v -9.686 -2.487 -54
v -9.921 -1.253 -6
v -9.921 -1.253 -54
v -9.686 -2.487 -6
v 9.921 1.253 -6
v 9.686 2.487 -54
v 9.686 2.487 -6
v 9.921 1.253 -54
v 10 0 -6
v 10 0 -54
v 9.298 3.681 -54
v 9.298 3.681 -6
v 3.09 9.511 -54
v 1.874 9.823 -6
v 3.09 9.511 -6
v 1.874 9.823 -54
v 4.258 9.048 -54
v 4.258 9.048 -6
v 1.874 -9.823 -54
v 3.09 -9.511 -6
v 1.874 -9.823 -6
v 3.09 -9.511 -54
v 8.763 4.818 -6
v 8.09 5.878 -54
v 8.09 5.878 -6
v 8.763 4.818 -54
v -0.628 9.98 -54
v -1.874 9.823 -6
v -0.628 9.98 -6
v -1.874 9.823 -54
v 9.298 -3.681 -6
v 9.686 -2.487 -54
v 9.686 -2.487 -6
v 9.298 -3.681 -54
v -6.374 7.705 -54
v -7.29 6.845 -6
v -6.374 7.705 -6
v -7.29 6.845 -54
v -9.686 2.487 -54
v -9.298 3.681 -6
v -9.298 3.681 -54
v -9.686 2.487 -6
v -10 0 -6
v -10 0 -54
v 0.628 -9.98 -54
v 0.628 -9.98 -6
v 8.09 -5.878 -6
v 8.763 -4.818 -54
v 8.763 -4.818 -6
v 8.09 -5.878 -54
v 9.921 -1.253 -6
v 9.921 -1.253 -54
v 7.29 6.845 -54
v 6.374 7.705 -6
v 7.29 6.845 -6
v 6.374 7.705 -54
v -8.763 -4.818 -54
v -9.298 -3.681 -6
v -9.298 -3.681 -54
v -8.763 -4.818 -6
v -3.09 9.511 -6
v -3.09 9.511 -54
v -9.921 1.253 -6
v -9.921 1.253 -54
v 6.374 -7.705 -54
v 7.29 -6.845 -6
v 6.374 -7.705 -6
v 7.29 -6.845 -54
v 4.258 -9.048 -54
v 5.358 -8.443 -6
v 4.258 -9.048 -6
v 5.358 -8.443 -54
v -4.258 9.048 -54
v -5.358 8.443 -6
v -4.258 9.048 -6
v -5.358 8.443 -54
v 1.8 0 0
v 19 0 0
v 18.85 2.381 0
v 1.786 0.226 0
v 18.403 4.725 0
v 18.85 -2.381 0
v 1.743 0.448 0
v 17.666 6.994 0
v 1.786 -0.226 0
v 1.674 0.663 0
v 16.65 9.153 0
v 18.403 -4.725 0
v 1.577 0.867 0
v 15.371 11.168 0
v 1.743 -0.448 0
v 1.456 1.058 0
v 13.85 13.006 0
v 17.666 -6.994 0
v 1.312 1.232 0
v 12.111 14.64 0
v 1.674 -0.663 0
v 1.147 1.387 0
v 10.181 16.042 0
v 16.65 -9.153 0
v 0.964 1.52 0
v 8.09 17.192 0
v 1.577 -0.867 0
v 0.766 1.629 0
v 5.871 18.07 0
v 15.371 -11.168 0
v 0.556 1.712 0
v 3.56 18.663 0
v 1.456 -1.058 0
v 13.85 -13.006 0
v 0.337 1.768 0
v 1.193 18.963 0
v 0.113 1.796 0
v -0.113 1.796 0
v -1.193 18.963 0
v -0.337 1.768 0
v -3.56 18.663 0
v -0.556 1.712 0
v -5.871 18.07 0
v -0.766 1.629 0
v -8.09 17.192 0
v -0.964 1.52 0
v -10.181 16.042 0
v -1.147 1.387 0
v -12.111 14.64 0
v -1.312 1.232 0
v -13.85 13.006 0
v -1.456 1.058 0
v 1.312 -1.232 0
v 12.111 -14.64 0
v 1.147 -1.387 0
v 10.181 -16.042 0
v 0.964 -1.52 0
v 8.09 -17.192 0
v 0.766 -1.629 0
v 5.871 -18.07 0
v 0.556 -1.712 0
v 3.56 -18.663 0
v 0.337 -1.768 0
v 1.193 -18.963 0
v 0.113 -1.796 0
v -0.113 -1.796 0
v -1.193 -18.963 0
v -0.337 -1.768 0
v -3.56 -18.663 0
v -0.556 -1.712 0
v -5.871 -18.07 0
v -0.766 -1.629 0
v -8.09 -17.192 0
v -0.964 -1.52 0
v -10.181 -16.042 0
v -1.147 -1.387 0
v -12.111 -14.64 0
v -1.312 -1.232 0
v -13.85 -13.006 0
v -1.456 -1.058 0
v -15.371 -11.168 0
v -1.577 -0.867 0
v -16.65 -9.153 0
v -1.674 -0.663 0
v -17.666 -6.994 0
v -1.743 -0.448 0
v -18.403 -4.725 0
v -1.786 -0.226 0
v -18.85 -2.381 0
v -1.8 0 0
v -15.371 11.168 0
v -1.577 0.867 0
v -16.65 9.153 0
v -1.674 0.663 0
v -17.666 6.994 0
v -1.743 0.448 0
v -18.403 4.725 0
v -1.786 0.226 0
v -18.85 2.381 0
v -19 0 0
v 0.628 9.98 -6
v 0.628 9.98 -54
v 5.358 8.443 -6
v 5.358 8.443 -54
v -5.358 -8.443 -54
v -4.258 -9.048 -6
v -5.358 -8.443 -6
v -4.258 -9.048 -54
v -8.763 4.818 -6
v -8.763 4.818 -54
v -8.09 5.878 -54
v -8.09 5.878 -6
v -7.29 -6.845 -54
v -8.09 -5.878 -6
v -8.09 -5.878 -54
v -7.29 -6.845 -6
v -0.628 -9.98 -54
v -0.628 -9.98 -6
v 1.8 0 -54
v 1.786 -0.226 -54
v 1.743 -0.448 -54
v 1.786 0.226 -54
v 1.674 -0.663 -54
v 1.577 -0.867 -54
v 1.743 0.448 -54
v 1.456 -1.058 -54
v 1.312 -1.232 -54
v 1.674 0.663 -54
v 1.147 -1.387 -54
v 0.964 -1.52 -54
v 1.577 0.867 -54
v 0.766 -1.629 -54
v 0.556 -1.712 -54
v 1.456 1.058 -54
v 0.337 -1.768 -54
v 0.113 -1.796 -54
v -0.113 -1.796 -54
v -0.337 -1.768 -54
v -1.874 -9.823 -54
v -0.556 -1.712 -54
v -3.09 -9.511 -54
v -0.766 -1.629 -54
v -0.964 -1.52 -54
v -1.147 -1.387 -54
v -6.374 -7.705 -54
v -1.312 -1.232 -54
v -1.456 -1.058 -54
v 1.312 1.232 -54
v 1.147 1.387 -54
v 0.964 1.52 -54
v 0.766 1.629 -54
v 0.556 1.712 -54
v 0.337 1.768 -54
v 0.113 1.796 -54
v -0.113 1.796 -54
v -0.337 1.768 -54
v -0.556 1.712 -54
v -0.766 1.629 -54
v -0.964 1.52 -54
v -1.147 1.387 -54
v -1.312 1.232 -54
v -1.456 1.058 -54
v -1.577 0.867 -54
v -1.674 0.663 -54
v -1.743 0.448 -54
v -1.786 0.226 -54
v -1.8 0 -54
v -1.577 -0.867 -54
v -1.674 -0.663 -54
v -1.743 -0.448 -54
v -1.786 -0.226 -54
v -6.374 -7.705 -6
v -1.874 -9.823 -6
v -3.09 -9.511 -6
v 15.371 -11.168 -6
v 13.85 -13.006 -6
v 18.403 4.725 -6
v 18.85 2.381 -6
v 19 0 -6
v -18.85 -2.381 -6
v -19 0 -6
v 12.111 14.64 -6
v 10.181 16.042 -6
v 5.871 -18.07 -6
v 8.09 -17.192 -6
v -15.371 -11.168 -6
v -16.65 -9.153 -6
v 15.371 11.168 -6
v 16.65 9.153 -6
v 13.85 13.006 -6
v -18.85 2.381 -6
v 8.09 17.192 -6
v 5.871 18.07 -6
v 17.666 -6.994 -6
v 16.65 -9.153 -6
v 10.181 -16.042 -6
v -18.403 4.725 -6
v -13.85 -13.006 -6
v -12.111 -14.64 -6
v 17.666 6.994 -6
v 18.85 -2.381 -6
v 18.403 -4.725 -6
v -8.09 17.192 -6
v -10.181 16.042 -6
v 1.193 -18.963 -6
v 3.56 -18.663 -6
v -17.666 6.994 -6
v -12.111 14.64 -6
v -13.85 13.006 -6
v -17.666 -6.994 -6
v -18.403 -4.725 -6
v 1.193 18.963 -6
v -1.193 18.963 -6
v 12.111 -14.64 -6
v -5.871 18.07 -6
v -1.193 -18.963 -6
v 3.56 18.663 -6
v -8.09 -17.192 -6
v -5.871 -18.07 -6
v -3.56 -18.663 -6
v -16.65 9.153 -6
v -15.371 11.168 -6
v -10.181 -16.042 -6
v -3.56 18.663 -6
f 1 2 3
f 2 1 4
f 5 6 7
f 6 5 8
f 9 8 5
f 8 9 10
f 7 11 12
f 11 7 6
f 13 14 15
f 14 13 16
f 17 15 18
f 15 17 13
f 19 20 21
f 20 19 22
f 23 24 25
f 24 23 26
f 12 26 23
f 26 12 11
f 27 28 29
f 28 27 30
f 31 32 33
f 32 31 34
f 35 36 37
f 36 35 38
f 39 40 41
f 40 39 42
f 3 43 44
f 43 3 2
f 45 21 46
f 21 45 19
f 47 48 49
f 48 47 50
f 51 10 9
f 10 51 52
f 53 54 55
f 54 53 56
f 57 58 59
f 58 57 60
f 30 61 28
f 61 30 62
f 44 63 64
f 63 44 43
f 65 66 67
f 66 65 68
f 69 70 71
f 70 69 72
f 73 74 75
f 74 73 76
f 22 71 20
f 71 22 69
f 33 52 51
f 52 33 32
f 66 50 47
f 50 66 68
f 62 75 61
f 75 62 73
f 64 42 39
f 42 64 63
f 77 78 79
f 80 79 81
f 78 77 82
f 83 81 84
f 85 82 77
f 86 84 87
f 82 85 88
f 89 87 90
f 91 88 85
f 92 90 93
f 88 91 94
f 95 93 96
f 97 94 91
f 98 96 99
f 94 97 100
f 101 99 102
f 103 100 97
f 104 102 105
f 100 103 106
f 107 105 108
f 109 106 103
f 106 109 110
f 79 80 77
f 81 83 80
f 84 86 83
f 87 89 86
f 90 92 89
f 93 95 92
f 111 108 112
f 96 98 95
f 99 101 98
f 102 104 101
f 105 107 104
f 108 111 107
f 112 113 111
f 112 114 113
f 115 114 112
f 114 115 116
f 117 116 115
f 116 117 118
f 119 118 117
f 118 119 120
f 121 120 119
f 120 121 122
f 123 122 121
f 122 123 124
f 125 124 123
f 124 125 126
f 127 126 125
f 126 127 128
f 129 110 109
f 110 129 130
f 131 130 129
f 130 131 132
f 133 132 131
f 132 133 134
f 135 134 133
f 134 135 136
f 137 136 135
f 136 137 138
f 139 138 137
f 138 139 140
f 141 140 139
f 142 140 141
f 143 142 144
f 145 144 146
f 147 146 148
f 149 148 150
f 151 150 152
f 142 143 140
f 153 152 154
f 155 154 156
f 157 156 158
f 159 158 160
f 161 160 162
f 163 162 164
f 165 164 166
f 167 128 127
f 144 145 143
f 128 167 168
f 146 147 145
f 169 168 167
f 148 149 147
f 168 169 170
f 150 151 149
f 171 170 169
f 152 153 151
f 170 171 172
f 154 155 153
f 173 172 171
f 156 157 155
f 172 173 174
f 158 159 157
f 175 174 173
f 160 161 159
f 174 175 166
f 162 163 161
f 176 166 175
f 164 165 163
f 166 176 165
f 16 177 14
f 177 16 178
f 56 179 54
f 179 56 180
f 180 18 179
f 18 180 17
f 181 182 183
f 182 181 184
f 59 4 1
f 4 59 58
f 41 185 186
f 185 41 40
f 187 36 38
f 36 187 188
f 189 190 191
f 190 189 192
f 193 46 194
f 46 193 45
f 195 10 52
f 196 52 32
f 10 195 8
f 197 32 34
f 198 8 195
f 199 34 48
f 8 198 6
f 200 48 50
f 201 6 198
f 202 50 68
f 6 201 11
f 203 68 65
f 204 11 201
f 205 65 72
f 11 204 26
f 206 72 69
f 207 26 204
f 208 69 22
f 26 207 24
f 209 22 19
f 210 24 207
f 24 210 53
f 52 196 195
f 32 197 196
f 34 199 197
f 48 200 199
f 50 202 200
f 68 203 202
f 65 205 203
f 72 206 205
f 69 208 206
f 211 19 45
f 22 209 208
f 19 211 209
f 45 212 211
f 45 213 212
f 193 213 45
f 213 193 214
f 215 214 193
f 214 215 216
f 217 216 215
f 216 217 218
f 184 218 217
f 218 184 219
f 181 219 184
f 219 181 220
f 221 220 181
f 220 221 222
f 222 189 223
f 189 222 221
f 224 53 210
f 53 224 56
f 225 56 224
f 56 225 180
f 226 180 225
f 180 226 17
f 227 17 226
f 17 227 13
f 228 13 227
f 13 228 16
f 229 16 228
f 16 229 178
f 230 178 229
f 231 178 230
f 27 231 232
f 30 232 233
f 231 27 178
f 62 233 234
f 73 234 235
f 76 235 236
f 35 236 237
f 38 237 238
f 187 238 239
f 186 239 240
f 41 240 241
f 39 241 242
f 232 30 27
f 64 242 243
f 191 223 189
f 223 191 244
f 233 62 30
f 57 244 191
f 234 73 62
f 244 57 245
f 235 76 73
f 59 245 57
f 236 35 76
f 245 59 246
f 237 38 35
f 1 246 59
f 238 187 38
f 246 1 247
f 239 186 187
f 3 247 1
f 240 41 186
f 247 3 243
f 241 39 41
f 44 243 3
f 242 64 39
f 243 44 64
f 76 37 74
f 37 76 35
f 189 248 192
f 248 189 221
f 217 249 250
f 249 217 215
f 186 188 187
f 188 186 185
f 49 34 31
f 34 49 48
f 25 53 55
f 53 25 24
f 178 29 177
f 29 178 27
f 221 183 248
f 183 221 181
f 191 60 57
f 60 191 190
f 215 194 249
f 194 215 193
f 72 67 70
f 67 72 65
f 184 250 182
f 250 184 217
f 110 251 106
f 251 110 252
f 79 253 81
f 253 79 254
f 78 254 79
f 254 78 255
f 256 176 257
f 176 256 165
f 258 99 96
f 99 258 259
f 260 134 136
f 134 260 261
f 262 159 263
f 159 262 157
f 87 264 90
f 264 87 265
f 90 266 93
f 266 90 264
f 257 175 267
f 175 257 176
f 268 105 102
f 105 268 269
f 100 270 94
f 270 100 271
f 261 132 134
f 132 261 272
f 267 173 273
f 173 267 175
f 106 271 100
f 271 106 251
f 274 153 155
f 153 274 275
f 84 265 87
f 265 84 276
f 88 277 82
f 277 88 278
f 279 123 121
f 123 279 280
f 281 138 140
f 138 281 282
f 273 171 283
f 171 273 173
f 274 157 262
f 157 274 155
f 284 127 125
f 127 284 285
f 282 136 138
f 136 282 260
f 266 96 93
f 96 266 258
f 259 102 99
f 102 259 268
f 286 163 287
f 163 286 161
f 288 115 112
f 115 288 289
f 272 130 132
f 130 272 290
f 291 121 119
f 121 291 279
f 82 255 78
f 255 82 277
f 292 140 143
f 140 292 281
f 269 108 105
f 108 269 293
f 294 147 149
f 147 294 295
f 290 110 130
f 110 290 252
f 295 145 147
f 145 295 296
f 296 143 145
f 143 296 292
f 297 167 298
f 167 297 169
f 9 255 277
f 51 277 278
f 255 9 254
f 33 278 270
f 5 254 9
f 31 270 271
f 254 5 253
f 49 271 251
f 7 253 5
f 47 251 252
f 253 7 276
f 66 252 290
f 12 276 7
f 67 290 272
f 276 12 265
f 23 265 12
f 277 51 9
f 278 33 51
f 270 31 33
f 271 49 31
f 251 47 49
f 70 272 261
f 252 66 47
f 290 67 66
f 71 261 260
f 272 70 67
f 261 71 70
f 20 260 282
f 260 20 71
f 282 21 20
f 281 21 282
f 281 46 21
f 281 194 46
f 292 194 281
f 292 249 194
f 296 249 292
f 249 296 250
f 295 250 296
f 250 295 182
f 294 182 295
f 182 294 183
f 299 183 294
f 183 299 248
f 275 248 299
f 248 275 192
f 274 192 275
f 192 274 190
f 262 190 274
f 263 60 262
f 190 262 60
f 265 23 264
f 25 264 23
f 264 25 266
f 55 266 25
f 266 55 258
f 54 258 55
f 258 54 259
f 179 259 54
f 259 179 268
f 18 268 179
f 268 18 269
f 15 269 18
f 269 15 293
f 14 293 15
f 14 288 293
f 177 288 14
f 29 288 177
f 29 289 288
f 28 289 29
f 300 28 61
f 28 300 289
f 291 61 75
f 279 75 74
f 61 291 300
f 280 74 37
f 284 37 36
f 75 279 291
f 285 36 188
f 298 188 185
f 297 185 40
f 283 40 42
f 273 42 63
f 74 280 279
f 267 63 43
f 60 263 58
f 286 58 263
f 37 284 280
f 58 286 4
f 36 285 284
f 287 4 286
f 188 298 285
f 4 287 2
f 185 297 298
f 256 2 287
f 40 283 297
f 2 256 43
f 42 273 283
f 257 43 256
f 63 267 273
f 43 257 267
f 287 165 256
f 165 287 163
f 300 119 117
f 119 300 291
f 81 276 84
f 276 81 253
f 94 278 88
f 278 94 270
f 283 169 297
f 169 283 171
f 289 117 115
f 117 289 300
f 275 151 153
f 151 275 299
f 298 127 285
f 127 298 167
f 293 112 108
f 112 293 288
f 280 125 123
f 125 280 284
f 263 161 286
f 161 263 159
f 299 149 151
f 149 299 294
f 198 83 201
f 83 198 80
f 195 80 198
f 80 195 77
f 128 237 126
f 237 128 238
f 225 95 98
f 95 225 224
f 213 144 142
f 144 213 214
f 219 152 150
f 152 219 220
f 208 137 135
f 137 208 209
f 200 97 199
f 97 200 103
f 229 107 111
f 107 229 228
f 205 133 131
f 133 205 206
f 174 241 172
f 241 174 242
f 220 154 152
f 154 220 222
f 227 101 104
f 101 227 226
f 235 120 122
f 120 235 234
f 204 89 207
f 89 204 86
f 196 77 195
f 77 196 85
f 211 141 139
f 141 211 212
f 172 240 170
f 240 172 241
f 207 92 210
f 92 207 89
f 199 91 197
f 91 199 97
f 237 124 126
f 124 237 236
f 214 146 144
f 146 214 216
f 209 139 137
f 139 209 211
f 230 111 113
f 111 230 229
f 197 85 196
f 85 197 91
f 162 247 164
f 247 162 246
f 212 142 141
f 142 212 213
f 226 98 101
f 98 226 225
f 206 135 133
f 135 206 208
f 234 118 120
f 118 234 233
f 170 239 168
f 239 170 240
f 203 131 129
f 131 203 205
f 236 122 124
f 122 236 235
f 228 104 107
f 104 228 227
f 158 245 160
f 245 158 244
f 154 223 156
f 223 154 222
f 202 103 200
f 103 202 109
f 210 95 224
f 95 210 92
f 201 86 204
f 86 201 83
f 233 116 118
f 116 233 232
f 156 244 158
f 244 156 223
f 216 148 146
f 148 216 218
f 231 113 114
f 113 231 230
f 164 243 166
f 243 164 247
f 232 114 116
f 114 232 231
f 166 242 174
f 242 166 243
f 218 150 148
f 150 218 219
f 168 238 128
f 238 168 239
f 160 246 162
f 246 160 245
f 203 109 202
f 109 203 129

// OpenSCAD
$fn = 50;


difference() {
	union() {
		translate(v = [0, 0, -54.0000000000]) {
			cylinder(h = 54, r = 10.0000000000);
		}
		translate(v = [0, 0, -6.0000000000]) {
			cylinder(h = 6, r = 19.0000000000);
		}
	}
	union() {
		#translate(v = [0, 0, -54]) {
			cylinder(h = 54, r = 1.8000000000);
		}
	}
}
